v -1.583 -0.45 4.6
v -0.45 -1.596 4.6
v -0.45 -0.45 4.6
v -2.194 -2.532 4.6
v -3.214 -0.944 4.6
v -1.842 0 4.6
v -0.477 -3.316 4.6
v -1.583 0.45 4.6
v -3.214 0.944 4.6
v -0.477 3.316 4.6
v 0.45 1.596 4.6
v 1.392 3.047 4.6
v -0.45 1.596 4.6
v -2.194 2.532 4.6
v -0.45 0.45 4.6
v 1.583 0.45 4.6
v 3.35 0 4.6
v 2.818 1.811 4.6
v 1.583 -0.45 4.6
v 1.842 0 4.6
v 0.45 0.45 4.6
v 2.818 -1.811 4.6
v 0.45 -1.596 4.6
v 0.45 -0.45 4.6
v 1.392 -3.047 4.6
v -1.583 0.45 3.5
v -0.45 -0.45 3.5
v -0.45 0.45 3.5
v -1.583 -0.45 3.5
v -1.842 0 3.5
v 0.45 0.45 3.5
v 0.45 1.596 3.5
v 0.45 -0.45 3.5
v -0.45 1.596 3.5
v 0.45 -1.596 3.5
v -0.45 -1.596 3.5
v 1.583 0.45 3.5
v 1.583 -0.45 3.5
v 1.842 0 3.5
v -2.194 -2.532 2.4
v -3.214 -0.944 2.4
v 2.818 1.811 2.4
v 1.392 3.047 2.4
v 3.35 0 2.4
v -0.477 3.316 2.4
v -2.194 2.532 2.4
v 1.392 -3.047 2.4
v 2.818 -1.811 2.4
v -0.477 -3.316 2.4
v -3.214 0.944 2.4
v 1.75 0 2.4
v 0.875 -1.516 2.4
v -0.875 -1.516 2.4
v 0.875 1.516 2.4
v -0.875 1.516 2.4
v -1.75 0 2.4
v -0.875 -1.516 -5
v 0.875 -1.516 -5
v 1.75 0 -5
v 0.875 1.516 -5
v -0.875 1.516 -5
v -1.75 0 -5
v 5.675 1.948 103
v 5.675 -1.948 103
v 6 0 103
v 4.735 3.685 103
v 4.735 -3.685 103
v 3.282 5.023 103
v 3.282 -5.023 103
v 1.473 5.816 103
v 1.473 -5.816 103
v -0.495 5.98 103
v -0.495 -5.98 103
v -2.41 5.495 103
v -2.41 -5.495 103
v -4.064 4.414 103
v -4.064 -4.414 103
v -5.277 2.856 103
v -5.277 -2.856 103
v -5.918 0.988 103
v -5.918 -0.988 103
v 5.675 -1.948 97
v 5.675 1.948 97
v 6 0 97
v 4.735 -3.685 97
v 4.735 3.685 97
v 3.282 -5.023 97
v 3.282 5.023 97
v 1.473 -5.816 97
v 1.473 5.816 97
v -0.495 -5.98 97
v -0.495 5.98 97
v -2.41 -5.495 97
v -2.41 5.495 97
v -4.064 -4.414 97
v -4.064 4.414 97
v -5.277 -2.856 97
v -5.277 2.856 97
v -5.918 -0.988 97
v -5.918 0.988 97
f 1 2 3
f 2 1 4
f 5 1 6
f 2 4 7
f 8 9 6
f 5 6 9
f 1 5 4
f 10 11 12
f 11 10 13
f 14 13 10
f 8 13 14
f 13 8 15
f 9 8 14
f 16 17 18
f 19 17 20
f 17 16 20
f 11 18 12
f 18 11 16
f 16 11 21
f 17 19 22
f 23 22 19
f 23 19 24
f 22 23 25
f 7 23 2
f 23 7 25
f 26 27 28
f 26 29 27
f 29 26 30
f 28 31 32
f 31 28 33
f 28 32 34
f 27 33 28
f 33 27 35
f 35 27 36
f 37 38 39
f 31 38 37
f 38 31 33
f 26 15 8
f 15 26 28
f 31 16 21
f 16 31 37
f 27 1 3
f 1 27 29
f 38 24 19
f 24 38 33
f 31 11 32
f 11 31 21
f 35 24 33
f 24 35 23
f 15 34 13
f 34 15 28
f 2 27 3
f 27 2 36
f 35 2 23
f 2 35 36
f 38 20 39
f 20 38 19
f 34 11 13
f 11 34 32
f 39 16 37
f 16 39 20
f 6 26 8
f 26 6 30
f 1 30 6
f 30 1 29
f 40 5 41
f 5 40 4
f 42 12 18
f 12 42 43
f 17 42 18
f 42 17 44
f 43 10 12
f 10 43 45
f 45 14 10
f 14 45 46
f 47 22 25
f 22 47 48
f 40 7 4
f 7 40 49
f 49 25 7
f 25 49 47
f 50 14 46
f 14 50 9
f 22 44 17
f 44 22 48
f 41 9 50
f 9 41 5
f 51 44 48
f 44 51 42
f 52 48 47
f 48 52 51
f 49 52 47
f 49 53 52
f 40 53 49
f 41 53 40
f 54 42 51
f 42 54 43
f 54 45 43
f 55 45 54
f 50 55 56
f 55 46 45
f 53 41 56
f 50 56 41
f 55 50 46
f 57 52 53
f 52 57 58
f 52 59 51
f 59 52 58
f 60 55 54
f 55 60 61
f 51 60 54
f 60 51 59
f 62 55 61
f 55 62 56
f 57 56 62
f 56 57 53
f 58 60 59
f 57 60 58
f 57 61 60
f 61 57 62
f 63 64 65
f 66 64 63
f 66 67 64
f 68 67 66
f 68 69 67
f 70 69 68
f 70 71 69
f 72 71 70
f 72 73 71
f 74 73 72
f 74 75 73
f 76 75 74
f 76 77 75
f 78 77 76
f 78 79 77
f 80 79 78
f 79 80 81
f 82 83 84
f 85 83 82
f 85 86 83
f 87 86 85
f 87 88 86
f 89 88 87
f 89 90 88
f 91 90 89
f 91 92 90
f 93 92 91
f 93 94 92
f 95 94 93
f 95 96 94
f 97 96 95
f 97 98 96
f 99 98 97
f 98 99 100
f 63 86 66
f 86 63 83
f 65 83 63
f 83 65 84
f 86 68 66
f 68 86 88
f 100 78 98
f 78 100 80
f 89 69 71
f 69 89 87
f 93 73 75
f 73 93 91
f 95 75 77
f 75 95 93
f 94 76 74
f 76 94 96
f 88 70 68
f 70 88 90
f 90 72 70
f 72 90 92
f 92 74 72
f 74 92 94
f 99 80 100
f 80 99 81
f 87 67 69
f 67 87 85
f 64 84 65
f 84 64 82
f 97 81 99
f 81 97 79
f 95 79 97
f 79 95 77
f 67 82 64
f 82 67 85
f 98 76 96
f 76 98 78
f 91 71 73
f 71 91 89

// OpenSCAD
// Parameters
major_diameter = 3.5; //[1.75:7:0.05]
length = 10; //[5:20:0.5]
head_diameter = 6.7; //[3.35:13.4:0.05]
head_height = 2.2; //[1.1:4.4:0.05]
threaded = 1; //[0:1:1]
thread_detail_level = 1; //[0:2:1]
drive_type = 1; //[0:1:1]
overlap = 0.8; //[0.2:2:0.1]
tip_length = 0.8; //[0.2:2:0.1]
recess_depth = 1.1; //[0.4:1.8:0.05]
recess_width = 0.9; //[0.4:1.6:0.05]
recess_radius_factor = 0.55; //[0.35:0.75:0.01]
thread_ring_pitch = 0.8; //[0.4:1.6:0.05]
thread_ring_thickness = 0.25; //[0.1:0.6:0.05]
thread_ring_radial = 0.18; //[0.05:0.4:0.01]
pcb_spacer_height = 6; //[3:12:0.5]
washer_thickness = 0.8; //[0.4:1.6:0.05]
buzzer_diameter = 12; //[6:24:0.5]

// Screw components
module screw_shank() {
  translate([0, 0, -head_height/2])
    cylinder(h=length - head_height, r=major_diameter/2, center=true);
}

module shank_tip() {
  translate([0, 0, -head_height/2 - (length - head_height)/2 + tip_length/2])
    cylinder(h=tip_length, r1=major_diameter/2, r2=0, center=true);
}

module pan_head() {
  translate([0, 0, (length - head_height)/2 - overlap/2])
    cylinder(h=head_height, r=head_diameter/2, center=true);
}

module drive_recess() {
  intersection() {
    translate([0, 0, (length - head_height)/2 - overlap/2 + head_height/2 - recess_depth/2])
      cylinder(h=recess_depth, r=(head_diameter/2)*recess_radius_factor, center=true);
    union() {
      translate([0, 0, (length - head_height)/2 - overlap/2 + head_height/2 - recess_depth/2])
        cube([(head_diameter/2)*recess_radius_factor*2, recess_width, recess_depth], center=true);
      translate([0, 0, (length - head_height)/2 - overlap/2 + head_height/2 - recess_depth/2])
        cube([recess_width, (head_diameter/2)*recess_radius_factor*2, recess_depth], center=true);
    }
  }
}

module head_with_recess() {
  difference() {
    pan_head();
    drive_recess();
  }
}

module screw_body() {
  union() {
    screw_shank();
    shank_tip();
    head_with_recess();
  }
}

module thread_representation() {
  if (threaded) {
    union() {
      for (i = [0:7]) {
        translate([0, 0, -head_height/2 - (length - head_height)/2 + tip_length + thread_ring_pitch*i])
          cylinder(h=thread_ring_thickness, r=major_diameter/2, center=true);
      }
    }
  }
}

// PCB Spacer
module pcb_spacer() {
  color([0.85, 0.85, 0.8]) {
    translate([0, 0, length*10])
      cylinder(h=pcb_spacer_height, r=major_diameter/2, center=true);
  }
}

// Screw and Washer
module screw_and_washer() {
  color("Silver") {
    translate([0, 0, length*10])
      cylinder(h=washer_thickness, r=head_diameter/2, center=true);
  }
}

// Buzzer
module buzzer() {
  color([0.1, 0.1, 0.6]) {
    translate([0, 0, length*10])
      cylinder(h=buzzer_diameter/2, r=buzzer_diameter/2, center=true);
  }
}

// Assembly
module assembly() {
  union() {
    screw_body();
    thread_representation();
    pcb_spacer();
    screw_and_washer();
    buzzer();
  }
}

assembly();
